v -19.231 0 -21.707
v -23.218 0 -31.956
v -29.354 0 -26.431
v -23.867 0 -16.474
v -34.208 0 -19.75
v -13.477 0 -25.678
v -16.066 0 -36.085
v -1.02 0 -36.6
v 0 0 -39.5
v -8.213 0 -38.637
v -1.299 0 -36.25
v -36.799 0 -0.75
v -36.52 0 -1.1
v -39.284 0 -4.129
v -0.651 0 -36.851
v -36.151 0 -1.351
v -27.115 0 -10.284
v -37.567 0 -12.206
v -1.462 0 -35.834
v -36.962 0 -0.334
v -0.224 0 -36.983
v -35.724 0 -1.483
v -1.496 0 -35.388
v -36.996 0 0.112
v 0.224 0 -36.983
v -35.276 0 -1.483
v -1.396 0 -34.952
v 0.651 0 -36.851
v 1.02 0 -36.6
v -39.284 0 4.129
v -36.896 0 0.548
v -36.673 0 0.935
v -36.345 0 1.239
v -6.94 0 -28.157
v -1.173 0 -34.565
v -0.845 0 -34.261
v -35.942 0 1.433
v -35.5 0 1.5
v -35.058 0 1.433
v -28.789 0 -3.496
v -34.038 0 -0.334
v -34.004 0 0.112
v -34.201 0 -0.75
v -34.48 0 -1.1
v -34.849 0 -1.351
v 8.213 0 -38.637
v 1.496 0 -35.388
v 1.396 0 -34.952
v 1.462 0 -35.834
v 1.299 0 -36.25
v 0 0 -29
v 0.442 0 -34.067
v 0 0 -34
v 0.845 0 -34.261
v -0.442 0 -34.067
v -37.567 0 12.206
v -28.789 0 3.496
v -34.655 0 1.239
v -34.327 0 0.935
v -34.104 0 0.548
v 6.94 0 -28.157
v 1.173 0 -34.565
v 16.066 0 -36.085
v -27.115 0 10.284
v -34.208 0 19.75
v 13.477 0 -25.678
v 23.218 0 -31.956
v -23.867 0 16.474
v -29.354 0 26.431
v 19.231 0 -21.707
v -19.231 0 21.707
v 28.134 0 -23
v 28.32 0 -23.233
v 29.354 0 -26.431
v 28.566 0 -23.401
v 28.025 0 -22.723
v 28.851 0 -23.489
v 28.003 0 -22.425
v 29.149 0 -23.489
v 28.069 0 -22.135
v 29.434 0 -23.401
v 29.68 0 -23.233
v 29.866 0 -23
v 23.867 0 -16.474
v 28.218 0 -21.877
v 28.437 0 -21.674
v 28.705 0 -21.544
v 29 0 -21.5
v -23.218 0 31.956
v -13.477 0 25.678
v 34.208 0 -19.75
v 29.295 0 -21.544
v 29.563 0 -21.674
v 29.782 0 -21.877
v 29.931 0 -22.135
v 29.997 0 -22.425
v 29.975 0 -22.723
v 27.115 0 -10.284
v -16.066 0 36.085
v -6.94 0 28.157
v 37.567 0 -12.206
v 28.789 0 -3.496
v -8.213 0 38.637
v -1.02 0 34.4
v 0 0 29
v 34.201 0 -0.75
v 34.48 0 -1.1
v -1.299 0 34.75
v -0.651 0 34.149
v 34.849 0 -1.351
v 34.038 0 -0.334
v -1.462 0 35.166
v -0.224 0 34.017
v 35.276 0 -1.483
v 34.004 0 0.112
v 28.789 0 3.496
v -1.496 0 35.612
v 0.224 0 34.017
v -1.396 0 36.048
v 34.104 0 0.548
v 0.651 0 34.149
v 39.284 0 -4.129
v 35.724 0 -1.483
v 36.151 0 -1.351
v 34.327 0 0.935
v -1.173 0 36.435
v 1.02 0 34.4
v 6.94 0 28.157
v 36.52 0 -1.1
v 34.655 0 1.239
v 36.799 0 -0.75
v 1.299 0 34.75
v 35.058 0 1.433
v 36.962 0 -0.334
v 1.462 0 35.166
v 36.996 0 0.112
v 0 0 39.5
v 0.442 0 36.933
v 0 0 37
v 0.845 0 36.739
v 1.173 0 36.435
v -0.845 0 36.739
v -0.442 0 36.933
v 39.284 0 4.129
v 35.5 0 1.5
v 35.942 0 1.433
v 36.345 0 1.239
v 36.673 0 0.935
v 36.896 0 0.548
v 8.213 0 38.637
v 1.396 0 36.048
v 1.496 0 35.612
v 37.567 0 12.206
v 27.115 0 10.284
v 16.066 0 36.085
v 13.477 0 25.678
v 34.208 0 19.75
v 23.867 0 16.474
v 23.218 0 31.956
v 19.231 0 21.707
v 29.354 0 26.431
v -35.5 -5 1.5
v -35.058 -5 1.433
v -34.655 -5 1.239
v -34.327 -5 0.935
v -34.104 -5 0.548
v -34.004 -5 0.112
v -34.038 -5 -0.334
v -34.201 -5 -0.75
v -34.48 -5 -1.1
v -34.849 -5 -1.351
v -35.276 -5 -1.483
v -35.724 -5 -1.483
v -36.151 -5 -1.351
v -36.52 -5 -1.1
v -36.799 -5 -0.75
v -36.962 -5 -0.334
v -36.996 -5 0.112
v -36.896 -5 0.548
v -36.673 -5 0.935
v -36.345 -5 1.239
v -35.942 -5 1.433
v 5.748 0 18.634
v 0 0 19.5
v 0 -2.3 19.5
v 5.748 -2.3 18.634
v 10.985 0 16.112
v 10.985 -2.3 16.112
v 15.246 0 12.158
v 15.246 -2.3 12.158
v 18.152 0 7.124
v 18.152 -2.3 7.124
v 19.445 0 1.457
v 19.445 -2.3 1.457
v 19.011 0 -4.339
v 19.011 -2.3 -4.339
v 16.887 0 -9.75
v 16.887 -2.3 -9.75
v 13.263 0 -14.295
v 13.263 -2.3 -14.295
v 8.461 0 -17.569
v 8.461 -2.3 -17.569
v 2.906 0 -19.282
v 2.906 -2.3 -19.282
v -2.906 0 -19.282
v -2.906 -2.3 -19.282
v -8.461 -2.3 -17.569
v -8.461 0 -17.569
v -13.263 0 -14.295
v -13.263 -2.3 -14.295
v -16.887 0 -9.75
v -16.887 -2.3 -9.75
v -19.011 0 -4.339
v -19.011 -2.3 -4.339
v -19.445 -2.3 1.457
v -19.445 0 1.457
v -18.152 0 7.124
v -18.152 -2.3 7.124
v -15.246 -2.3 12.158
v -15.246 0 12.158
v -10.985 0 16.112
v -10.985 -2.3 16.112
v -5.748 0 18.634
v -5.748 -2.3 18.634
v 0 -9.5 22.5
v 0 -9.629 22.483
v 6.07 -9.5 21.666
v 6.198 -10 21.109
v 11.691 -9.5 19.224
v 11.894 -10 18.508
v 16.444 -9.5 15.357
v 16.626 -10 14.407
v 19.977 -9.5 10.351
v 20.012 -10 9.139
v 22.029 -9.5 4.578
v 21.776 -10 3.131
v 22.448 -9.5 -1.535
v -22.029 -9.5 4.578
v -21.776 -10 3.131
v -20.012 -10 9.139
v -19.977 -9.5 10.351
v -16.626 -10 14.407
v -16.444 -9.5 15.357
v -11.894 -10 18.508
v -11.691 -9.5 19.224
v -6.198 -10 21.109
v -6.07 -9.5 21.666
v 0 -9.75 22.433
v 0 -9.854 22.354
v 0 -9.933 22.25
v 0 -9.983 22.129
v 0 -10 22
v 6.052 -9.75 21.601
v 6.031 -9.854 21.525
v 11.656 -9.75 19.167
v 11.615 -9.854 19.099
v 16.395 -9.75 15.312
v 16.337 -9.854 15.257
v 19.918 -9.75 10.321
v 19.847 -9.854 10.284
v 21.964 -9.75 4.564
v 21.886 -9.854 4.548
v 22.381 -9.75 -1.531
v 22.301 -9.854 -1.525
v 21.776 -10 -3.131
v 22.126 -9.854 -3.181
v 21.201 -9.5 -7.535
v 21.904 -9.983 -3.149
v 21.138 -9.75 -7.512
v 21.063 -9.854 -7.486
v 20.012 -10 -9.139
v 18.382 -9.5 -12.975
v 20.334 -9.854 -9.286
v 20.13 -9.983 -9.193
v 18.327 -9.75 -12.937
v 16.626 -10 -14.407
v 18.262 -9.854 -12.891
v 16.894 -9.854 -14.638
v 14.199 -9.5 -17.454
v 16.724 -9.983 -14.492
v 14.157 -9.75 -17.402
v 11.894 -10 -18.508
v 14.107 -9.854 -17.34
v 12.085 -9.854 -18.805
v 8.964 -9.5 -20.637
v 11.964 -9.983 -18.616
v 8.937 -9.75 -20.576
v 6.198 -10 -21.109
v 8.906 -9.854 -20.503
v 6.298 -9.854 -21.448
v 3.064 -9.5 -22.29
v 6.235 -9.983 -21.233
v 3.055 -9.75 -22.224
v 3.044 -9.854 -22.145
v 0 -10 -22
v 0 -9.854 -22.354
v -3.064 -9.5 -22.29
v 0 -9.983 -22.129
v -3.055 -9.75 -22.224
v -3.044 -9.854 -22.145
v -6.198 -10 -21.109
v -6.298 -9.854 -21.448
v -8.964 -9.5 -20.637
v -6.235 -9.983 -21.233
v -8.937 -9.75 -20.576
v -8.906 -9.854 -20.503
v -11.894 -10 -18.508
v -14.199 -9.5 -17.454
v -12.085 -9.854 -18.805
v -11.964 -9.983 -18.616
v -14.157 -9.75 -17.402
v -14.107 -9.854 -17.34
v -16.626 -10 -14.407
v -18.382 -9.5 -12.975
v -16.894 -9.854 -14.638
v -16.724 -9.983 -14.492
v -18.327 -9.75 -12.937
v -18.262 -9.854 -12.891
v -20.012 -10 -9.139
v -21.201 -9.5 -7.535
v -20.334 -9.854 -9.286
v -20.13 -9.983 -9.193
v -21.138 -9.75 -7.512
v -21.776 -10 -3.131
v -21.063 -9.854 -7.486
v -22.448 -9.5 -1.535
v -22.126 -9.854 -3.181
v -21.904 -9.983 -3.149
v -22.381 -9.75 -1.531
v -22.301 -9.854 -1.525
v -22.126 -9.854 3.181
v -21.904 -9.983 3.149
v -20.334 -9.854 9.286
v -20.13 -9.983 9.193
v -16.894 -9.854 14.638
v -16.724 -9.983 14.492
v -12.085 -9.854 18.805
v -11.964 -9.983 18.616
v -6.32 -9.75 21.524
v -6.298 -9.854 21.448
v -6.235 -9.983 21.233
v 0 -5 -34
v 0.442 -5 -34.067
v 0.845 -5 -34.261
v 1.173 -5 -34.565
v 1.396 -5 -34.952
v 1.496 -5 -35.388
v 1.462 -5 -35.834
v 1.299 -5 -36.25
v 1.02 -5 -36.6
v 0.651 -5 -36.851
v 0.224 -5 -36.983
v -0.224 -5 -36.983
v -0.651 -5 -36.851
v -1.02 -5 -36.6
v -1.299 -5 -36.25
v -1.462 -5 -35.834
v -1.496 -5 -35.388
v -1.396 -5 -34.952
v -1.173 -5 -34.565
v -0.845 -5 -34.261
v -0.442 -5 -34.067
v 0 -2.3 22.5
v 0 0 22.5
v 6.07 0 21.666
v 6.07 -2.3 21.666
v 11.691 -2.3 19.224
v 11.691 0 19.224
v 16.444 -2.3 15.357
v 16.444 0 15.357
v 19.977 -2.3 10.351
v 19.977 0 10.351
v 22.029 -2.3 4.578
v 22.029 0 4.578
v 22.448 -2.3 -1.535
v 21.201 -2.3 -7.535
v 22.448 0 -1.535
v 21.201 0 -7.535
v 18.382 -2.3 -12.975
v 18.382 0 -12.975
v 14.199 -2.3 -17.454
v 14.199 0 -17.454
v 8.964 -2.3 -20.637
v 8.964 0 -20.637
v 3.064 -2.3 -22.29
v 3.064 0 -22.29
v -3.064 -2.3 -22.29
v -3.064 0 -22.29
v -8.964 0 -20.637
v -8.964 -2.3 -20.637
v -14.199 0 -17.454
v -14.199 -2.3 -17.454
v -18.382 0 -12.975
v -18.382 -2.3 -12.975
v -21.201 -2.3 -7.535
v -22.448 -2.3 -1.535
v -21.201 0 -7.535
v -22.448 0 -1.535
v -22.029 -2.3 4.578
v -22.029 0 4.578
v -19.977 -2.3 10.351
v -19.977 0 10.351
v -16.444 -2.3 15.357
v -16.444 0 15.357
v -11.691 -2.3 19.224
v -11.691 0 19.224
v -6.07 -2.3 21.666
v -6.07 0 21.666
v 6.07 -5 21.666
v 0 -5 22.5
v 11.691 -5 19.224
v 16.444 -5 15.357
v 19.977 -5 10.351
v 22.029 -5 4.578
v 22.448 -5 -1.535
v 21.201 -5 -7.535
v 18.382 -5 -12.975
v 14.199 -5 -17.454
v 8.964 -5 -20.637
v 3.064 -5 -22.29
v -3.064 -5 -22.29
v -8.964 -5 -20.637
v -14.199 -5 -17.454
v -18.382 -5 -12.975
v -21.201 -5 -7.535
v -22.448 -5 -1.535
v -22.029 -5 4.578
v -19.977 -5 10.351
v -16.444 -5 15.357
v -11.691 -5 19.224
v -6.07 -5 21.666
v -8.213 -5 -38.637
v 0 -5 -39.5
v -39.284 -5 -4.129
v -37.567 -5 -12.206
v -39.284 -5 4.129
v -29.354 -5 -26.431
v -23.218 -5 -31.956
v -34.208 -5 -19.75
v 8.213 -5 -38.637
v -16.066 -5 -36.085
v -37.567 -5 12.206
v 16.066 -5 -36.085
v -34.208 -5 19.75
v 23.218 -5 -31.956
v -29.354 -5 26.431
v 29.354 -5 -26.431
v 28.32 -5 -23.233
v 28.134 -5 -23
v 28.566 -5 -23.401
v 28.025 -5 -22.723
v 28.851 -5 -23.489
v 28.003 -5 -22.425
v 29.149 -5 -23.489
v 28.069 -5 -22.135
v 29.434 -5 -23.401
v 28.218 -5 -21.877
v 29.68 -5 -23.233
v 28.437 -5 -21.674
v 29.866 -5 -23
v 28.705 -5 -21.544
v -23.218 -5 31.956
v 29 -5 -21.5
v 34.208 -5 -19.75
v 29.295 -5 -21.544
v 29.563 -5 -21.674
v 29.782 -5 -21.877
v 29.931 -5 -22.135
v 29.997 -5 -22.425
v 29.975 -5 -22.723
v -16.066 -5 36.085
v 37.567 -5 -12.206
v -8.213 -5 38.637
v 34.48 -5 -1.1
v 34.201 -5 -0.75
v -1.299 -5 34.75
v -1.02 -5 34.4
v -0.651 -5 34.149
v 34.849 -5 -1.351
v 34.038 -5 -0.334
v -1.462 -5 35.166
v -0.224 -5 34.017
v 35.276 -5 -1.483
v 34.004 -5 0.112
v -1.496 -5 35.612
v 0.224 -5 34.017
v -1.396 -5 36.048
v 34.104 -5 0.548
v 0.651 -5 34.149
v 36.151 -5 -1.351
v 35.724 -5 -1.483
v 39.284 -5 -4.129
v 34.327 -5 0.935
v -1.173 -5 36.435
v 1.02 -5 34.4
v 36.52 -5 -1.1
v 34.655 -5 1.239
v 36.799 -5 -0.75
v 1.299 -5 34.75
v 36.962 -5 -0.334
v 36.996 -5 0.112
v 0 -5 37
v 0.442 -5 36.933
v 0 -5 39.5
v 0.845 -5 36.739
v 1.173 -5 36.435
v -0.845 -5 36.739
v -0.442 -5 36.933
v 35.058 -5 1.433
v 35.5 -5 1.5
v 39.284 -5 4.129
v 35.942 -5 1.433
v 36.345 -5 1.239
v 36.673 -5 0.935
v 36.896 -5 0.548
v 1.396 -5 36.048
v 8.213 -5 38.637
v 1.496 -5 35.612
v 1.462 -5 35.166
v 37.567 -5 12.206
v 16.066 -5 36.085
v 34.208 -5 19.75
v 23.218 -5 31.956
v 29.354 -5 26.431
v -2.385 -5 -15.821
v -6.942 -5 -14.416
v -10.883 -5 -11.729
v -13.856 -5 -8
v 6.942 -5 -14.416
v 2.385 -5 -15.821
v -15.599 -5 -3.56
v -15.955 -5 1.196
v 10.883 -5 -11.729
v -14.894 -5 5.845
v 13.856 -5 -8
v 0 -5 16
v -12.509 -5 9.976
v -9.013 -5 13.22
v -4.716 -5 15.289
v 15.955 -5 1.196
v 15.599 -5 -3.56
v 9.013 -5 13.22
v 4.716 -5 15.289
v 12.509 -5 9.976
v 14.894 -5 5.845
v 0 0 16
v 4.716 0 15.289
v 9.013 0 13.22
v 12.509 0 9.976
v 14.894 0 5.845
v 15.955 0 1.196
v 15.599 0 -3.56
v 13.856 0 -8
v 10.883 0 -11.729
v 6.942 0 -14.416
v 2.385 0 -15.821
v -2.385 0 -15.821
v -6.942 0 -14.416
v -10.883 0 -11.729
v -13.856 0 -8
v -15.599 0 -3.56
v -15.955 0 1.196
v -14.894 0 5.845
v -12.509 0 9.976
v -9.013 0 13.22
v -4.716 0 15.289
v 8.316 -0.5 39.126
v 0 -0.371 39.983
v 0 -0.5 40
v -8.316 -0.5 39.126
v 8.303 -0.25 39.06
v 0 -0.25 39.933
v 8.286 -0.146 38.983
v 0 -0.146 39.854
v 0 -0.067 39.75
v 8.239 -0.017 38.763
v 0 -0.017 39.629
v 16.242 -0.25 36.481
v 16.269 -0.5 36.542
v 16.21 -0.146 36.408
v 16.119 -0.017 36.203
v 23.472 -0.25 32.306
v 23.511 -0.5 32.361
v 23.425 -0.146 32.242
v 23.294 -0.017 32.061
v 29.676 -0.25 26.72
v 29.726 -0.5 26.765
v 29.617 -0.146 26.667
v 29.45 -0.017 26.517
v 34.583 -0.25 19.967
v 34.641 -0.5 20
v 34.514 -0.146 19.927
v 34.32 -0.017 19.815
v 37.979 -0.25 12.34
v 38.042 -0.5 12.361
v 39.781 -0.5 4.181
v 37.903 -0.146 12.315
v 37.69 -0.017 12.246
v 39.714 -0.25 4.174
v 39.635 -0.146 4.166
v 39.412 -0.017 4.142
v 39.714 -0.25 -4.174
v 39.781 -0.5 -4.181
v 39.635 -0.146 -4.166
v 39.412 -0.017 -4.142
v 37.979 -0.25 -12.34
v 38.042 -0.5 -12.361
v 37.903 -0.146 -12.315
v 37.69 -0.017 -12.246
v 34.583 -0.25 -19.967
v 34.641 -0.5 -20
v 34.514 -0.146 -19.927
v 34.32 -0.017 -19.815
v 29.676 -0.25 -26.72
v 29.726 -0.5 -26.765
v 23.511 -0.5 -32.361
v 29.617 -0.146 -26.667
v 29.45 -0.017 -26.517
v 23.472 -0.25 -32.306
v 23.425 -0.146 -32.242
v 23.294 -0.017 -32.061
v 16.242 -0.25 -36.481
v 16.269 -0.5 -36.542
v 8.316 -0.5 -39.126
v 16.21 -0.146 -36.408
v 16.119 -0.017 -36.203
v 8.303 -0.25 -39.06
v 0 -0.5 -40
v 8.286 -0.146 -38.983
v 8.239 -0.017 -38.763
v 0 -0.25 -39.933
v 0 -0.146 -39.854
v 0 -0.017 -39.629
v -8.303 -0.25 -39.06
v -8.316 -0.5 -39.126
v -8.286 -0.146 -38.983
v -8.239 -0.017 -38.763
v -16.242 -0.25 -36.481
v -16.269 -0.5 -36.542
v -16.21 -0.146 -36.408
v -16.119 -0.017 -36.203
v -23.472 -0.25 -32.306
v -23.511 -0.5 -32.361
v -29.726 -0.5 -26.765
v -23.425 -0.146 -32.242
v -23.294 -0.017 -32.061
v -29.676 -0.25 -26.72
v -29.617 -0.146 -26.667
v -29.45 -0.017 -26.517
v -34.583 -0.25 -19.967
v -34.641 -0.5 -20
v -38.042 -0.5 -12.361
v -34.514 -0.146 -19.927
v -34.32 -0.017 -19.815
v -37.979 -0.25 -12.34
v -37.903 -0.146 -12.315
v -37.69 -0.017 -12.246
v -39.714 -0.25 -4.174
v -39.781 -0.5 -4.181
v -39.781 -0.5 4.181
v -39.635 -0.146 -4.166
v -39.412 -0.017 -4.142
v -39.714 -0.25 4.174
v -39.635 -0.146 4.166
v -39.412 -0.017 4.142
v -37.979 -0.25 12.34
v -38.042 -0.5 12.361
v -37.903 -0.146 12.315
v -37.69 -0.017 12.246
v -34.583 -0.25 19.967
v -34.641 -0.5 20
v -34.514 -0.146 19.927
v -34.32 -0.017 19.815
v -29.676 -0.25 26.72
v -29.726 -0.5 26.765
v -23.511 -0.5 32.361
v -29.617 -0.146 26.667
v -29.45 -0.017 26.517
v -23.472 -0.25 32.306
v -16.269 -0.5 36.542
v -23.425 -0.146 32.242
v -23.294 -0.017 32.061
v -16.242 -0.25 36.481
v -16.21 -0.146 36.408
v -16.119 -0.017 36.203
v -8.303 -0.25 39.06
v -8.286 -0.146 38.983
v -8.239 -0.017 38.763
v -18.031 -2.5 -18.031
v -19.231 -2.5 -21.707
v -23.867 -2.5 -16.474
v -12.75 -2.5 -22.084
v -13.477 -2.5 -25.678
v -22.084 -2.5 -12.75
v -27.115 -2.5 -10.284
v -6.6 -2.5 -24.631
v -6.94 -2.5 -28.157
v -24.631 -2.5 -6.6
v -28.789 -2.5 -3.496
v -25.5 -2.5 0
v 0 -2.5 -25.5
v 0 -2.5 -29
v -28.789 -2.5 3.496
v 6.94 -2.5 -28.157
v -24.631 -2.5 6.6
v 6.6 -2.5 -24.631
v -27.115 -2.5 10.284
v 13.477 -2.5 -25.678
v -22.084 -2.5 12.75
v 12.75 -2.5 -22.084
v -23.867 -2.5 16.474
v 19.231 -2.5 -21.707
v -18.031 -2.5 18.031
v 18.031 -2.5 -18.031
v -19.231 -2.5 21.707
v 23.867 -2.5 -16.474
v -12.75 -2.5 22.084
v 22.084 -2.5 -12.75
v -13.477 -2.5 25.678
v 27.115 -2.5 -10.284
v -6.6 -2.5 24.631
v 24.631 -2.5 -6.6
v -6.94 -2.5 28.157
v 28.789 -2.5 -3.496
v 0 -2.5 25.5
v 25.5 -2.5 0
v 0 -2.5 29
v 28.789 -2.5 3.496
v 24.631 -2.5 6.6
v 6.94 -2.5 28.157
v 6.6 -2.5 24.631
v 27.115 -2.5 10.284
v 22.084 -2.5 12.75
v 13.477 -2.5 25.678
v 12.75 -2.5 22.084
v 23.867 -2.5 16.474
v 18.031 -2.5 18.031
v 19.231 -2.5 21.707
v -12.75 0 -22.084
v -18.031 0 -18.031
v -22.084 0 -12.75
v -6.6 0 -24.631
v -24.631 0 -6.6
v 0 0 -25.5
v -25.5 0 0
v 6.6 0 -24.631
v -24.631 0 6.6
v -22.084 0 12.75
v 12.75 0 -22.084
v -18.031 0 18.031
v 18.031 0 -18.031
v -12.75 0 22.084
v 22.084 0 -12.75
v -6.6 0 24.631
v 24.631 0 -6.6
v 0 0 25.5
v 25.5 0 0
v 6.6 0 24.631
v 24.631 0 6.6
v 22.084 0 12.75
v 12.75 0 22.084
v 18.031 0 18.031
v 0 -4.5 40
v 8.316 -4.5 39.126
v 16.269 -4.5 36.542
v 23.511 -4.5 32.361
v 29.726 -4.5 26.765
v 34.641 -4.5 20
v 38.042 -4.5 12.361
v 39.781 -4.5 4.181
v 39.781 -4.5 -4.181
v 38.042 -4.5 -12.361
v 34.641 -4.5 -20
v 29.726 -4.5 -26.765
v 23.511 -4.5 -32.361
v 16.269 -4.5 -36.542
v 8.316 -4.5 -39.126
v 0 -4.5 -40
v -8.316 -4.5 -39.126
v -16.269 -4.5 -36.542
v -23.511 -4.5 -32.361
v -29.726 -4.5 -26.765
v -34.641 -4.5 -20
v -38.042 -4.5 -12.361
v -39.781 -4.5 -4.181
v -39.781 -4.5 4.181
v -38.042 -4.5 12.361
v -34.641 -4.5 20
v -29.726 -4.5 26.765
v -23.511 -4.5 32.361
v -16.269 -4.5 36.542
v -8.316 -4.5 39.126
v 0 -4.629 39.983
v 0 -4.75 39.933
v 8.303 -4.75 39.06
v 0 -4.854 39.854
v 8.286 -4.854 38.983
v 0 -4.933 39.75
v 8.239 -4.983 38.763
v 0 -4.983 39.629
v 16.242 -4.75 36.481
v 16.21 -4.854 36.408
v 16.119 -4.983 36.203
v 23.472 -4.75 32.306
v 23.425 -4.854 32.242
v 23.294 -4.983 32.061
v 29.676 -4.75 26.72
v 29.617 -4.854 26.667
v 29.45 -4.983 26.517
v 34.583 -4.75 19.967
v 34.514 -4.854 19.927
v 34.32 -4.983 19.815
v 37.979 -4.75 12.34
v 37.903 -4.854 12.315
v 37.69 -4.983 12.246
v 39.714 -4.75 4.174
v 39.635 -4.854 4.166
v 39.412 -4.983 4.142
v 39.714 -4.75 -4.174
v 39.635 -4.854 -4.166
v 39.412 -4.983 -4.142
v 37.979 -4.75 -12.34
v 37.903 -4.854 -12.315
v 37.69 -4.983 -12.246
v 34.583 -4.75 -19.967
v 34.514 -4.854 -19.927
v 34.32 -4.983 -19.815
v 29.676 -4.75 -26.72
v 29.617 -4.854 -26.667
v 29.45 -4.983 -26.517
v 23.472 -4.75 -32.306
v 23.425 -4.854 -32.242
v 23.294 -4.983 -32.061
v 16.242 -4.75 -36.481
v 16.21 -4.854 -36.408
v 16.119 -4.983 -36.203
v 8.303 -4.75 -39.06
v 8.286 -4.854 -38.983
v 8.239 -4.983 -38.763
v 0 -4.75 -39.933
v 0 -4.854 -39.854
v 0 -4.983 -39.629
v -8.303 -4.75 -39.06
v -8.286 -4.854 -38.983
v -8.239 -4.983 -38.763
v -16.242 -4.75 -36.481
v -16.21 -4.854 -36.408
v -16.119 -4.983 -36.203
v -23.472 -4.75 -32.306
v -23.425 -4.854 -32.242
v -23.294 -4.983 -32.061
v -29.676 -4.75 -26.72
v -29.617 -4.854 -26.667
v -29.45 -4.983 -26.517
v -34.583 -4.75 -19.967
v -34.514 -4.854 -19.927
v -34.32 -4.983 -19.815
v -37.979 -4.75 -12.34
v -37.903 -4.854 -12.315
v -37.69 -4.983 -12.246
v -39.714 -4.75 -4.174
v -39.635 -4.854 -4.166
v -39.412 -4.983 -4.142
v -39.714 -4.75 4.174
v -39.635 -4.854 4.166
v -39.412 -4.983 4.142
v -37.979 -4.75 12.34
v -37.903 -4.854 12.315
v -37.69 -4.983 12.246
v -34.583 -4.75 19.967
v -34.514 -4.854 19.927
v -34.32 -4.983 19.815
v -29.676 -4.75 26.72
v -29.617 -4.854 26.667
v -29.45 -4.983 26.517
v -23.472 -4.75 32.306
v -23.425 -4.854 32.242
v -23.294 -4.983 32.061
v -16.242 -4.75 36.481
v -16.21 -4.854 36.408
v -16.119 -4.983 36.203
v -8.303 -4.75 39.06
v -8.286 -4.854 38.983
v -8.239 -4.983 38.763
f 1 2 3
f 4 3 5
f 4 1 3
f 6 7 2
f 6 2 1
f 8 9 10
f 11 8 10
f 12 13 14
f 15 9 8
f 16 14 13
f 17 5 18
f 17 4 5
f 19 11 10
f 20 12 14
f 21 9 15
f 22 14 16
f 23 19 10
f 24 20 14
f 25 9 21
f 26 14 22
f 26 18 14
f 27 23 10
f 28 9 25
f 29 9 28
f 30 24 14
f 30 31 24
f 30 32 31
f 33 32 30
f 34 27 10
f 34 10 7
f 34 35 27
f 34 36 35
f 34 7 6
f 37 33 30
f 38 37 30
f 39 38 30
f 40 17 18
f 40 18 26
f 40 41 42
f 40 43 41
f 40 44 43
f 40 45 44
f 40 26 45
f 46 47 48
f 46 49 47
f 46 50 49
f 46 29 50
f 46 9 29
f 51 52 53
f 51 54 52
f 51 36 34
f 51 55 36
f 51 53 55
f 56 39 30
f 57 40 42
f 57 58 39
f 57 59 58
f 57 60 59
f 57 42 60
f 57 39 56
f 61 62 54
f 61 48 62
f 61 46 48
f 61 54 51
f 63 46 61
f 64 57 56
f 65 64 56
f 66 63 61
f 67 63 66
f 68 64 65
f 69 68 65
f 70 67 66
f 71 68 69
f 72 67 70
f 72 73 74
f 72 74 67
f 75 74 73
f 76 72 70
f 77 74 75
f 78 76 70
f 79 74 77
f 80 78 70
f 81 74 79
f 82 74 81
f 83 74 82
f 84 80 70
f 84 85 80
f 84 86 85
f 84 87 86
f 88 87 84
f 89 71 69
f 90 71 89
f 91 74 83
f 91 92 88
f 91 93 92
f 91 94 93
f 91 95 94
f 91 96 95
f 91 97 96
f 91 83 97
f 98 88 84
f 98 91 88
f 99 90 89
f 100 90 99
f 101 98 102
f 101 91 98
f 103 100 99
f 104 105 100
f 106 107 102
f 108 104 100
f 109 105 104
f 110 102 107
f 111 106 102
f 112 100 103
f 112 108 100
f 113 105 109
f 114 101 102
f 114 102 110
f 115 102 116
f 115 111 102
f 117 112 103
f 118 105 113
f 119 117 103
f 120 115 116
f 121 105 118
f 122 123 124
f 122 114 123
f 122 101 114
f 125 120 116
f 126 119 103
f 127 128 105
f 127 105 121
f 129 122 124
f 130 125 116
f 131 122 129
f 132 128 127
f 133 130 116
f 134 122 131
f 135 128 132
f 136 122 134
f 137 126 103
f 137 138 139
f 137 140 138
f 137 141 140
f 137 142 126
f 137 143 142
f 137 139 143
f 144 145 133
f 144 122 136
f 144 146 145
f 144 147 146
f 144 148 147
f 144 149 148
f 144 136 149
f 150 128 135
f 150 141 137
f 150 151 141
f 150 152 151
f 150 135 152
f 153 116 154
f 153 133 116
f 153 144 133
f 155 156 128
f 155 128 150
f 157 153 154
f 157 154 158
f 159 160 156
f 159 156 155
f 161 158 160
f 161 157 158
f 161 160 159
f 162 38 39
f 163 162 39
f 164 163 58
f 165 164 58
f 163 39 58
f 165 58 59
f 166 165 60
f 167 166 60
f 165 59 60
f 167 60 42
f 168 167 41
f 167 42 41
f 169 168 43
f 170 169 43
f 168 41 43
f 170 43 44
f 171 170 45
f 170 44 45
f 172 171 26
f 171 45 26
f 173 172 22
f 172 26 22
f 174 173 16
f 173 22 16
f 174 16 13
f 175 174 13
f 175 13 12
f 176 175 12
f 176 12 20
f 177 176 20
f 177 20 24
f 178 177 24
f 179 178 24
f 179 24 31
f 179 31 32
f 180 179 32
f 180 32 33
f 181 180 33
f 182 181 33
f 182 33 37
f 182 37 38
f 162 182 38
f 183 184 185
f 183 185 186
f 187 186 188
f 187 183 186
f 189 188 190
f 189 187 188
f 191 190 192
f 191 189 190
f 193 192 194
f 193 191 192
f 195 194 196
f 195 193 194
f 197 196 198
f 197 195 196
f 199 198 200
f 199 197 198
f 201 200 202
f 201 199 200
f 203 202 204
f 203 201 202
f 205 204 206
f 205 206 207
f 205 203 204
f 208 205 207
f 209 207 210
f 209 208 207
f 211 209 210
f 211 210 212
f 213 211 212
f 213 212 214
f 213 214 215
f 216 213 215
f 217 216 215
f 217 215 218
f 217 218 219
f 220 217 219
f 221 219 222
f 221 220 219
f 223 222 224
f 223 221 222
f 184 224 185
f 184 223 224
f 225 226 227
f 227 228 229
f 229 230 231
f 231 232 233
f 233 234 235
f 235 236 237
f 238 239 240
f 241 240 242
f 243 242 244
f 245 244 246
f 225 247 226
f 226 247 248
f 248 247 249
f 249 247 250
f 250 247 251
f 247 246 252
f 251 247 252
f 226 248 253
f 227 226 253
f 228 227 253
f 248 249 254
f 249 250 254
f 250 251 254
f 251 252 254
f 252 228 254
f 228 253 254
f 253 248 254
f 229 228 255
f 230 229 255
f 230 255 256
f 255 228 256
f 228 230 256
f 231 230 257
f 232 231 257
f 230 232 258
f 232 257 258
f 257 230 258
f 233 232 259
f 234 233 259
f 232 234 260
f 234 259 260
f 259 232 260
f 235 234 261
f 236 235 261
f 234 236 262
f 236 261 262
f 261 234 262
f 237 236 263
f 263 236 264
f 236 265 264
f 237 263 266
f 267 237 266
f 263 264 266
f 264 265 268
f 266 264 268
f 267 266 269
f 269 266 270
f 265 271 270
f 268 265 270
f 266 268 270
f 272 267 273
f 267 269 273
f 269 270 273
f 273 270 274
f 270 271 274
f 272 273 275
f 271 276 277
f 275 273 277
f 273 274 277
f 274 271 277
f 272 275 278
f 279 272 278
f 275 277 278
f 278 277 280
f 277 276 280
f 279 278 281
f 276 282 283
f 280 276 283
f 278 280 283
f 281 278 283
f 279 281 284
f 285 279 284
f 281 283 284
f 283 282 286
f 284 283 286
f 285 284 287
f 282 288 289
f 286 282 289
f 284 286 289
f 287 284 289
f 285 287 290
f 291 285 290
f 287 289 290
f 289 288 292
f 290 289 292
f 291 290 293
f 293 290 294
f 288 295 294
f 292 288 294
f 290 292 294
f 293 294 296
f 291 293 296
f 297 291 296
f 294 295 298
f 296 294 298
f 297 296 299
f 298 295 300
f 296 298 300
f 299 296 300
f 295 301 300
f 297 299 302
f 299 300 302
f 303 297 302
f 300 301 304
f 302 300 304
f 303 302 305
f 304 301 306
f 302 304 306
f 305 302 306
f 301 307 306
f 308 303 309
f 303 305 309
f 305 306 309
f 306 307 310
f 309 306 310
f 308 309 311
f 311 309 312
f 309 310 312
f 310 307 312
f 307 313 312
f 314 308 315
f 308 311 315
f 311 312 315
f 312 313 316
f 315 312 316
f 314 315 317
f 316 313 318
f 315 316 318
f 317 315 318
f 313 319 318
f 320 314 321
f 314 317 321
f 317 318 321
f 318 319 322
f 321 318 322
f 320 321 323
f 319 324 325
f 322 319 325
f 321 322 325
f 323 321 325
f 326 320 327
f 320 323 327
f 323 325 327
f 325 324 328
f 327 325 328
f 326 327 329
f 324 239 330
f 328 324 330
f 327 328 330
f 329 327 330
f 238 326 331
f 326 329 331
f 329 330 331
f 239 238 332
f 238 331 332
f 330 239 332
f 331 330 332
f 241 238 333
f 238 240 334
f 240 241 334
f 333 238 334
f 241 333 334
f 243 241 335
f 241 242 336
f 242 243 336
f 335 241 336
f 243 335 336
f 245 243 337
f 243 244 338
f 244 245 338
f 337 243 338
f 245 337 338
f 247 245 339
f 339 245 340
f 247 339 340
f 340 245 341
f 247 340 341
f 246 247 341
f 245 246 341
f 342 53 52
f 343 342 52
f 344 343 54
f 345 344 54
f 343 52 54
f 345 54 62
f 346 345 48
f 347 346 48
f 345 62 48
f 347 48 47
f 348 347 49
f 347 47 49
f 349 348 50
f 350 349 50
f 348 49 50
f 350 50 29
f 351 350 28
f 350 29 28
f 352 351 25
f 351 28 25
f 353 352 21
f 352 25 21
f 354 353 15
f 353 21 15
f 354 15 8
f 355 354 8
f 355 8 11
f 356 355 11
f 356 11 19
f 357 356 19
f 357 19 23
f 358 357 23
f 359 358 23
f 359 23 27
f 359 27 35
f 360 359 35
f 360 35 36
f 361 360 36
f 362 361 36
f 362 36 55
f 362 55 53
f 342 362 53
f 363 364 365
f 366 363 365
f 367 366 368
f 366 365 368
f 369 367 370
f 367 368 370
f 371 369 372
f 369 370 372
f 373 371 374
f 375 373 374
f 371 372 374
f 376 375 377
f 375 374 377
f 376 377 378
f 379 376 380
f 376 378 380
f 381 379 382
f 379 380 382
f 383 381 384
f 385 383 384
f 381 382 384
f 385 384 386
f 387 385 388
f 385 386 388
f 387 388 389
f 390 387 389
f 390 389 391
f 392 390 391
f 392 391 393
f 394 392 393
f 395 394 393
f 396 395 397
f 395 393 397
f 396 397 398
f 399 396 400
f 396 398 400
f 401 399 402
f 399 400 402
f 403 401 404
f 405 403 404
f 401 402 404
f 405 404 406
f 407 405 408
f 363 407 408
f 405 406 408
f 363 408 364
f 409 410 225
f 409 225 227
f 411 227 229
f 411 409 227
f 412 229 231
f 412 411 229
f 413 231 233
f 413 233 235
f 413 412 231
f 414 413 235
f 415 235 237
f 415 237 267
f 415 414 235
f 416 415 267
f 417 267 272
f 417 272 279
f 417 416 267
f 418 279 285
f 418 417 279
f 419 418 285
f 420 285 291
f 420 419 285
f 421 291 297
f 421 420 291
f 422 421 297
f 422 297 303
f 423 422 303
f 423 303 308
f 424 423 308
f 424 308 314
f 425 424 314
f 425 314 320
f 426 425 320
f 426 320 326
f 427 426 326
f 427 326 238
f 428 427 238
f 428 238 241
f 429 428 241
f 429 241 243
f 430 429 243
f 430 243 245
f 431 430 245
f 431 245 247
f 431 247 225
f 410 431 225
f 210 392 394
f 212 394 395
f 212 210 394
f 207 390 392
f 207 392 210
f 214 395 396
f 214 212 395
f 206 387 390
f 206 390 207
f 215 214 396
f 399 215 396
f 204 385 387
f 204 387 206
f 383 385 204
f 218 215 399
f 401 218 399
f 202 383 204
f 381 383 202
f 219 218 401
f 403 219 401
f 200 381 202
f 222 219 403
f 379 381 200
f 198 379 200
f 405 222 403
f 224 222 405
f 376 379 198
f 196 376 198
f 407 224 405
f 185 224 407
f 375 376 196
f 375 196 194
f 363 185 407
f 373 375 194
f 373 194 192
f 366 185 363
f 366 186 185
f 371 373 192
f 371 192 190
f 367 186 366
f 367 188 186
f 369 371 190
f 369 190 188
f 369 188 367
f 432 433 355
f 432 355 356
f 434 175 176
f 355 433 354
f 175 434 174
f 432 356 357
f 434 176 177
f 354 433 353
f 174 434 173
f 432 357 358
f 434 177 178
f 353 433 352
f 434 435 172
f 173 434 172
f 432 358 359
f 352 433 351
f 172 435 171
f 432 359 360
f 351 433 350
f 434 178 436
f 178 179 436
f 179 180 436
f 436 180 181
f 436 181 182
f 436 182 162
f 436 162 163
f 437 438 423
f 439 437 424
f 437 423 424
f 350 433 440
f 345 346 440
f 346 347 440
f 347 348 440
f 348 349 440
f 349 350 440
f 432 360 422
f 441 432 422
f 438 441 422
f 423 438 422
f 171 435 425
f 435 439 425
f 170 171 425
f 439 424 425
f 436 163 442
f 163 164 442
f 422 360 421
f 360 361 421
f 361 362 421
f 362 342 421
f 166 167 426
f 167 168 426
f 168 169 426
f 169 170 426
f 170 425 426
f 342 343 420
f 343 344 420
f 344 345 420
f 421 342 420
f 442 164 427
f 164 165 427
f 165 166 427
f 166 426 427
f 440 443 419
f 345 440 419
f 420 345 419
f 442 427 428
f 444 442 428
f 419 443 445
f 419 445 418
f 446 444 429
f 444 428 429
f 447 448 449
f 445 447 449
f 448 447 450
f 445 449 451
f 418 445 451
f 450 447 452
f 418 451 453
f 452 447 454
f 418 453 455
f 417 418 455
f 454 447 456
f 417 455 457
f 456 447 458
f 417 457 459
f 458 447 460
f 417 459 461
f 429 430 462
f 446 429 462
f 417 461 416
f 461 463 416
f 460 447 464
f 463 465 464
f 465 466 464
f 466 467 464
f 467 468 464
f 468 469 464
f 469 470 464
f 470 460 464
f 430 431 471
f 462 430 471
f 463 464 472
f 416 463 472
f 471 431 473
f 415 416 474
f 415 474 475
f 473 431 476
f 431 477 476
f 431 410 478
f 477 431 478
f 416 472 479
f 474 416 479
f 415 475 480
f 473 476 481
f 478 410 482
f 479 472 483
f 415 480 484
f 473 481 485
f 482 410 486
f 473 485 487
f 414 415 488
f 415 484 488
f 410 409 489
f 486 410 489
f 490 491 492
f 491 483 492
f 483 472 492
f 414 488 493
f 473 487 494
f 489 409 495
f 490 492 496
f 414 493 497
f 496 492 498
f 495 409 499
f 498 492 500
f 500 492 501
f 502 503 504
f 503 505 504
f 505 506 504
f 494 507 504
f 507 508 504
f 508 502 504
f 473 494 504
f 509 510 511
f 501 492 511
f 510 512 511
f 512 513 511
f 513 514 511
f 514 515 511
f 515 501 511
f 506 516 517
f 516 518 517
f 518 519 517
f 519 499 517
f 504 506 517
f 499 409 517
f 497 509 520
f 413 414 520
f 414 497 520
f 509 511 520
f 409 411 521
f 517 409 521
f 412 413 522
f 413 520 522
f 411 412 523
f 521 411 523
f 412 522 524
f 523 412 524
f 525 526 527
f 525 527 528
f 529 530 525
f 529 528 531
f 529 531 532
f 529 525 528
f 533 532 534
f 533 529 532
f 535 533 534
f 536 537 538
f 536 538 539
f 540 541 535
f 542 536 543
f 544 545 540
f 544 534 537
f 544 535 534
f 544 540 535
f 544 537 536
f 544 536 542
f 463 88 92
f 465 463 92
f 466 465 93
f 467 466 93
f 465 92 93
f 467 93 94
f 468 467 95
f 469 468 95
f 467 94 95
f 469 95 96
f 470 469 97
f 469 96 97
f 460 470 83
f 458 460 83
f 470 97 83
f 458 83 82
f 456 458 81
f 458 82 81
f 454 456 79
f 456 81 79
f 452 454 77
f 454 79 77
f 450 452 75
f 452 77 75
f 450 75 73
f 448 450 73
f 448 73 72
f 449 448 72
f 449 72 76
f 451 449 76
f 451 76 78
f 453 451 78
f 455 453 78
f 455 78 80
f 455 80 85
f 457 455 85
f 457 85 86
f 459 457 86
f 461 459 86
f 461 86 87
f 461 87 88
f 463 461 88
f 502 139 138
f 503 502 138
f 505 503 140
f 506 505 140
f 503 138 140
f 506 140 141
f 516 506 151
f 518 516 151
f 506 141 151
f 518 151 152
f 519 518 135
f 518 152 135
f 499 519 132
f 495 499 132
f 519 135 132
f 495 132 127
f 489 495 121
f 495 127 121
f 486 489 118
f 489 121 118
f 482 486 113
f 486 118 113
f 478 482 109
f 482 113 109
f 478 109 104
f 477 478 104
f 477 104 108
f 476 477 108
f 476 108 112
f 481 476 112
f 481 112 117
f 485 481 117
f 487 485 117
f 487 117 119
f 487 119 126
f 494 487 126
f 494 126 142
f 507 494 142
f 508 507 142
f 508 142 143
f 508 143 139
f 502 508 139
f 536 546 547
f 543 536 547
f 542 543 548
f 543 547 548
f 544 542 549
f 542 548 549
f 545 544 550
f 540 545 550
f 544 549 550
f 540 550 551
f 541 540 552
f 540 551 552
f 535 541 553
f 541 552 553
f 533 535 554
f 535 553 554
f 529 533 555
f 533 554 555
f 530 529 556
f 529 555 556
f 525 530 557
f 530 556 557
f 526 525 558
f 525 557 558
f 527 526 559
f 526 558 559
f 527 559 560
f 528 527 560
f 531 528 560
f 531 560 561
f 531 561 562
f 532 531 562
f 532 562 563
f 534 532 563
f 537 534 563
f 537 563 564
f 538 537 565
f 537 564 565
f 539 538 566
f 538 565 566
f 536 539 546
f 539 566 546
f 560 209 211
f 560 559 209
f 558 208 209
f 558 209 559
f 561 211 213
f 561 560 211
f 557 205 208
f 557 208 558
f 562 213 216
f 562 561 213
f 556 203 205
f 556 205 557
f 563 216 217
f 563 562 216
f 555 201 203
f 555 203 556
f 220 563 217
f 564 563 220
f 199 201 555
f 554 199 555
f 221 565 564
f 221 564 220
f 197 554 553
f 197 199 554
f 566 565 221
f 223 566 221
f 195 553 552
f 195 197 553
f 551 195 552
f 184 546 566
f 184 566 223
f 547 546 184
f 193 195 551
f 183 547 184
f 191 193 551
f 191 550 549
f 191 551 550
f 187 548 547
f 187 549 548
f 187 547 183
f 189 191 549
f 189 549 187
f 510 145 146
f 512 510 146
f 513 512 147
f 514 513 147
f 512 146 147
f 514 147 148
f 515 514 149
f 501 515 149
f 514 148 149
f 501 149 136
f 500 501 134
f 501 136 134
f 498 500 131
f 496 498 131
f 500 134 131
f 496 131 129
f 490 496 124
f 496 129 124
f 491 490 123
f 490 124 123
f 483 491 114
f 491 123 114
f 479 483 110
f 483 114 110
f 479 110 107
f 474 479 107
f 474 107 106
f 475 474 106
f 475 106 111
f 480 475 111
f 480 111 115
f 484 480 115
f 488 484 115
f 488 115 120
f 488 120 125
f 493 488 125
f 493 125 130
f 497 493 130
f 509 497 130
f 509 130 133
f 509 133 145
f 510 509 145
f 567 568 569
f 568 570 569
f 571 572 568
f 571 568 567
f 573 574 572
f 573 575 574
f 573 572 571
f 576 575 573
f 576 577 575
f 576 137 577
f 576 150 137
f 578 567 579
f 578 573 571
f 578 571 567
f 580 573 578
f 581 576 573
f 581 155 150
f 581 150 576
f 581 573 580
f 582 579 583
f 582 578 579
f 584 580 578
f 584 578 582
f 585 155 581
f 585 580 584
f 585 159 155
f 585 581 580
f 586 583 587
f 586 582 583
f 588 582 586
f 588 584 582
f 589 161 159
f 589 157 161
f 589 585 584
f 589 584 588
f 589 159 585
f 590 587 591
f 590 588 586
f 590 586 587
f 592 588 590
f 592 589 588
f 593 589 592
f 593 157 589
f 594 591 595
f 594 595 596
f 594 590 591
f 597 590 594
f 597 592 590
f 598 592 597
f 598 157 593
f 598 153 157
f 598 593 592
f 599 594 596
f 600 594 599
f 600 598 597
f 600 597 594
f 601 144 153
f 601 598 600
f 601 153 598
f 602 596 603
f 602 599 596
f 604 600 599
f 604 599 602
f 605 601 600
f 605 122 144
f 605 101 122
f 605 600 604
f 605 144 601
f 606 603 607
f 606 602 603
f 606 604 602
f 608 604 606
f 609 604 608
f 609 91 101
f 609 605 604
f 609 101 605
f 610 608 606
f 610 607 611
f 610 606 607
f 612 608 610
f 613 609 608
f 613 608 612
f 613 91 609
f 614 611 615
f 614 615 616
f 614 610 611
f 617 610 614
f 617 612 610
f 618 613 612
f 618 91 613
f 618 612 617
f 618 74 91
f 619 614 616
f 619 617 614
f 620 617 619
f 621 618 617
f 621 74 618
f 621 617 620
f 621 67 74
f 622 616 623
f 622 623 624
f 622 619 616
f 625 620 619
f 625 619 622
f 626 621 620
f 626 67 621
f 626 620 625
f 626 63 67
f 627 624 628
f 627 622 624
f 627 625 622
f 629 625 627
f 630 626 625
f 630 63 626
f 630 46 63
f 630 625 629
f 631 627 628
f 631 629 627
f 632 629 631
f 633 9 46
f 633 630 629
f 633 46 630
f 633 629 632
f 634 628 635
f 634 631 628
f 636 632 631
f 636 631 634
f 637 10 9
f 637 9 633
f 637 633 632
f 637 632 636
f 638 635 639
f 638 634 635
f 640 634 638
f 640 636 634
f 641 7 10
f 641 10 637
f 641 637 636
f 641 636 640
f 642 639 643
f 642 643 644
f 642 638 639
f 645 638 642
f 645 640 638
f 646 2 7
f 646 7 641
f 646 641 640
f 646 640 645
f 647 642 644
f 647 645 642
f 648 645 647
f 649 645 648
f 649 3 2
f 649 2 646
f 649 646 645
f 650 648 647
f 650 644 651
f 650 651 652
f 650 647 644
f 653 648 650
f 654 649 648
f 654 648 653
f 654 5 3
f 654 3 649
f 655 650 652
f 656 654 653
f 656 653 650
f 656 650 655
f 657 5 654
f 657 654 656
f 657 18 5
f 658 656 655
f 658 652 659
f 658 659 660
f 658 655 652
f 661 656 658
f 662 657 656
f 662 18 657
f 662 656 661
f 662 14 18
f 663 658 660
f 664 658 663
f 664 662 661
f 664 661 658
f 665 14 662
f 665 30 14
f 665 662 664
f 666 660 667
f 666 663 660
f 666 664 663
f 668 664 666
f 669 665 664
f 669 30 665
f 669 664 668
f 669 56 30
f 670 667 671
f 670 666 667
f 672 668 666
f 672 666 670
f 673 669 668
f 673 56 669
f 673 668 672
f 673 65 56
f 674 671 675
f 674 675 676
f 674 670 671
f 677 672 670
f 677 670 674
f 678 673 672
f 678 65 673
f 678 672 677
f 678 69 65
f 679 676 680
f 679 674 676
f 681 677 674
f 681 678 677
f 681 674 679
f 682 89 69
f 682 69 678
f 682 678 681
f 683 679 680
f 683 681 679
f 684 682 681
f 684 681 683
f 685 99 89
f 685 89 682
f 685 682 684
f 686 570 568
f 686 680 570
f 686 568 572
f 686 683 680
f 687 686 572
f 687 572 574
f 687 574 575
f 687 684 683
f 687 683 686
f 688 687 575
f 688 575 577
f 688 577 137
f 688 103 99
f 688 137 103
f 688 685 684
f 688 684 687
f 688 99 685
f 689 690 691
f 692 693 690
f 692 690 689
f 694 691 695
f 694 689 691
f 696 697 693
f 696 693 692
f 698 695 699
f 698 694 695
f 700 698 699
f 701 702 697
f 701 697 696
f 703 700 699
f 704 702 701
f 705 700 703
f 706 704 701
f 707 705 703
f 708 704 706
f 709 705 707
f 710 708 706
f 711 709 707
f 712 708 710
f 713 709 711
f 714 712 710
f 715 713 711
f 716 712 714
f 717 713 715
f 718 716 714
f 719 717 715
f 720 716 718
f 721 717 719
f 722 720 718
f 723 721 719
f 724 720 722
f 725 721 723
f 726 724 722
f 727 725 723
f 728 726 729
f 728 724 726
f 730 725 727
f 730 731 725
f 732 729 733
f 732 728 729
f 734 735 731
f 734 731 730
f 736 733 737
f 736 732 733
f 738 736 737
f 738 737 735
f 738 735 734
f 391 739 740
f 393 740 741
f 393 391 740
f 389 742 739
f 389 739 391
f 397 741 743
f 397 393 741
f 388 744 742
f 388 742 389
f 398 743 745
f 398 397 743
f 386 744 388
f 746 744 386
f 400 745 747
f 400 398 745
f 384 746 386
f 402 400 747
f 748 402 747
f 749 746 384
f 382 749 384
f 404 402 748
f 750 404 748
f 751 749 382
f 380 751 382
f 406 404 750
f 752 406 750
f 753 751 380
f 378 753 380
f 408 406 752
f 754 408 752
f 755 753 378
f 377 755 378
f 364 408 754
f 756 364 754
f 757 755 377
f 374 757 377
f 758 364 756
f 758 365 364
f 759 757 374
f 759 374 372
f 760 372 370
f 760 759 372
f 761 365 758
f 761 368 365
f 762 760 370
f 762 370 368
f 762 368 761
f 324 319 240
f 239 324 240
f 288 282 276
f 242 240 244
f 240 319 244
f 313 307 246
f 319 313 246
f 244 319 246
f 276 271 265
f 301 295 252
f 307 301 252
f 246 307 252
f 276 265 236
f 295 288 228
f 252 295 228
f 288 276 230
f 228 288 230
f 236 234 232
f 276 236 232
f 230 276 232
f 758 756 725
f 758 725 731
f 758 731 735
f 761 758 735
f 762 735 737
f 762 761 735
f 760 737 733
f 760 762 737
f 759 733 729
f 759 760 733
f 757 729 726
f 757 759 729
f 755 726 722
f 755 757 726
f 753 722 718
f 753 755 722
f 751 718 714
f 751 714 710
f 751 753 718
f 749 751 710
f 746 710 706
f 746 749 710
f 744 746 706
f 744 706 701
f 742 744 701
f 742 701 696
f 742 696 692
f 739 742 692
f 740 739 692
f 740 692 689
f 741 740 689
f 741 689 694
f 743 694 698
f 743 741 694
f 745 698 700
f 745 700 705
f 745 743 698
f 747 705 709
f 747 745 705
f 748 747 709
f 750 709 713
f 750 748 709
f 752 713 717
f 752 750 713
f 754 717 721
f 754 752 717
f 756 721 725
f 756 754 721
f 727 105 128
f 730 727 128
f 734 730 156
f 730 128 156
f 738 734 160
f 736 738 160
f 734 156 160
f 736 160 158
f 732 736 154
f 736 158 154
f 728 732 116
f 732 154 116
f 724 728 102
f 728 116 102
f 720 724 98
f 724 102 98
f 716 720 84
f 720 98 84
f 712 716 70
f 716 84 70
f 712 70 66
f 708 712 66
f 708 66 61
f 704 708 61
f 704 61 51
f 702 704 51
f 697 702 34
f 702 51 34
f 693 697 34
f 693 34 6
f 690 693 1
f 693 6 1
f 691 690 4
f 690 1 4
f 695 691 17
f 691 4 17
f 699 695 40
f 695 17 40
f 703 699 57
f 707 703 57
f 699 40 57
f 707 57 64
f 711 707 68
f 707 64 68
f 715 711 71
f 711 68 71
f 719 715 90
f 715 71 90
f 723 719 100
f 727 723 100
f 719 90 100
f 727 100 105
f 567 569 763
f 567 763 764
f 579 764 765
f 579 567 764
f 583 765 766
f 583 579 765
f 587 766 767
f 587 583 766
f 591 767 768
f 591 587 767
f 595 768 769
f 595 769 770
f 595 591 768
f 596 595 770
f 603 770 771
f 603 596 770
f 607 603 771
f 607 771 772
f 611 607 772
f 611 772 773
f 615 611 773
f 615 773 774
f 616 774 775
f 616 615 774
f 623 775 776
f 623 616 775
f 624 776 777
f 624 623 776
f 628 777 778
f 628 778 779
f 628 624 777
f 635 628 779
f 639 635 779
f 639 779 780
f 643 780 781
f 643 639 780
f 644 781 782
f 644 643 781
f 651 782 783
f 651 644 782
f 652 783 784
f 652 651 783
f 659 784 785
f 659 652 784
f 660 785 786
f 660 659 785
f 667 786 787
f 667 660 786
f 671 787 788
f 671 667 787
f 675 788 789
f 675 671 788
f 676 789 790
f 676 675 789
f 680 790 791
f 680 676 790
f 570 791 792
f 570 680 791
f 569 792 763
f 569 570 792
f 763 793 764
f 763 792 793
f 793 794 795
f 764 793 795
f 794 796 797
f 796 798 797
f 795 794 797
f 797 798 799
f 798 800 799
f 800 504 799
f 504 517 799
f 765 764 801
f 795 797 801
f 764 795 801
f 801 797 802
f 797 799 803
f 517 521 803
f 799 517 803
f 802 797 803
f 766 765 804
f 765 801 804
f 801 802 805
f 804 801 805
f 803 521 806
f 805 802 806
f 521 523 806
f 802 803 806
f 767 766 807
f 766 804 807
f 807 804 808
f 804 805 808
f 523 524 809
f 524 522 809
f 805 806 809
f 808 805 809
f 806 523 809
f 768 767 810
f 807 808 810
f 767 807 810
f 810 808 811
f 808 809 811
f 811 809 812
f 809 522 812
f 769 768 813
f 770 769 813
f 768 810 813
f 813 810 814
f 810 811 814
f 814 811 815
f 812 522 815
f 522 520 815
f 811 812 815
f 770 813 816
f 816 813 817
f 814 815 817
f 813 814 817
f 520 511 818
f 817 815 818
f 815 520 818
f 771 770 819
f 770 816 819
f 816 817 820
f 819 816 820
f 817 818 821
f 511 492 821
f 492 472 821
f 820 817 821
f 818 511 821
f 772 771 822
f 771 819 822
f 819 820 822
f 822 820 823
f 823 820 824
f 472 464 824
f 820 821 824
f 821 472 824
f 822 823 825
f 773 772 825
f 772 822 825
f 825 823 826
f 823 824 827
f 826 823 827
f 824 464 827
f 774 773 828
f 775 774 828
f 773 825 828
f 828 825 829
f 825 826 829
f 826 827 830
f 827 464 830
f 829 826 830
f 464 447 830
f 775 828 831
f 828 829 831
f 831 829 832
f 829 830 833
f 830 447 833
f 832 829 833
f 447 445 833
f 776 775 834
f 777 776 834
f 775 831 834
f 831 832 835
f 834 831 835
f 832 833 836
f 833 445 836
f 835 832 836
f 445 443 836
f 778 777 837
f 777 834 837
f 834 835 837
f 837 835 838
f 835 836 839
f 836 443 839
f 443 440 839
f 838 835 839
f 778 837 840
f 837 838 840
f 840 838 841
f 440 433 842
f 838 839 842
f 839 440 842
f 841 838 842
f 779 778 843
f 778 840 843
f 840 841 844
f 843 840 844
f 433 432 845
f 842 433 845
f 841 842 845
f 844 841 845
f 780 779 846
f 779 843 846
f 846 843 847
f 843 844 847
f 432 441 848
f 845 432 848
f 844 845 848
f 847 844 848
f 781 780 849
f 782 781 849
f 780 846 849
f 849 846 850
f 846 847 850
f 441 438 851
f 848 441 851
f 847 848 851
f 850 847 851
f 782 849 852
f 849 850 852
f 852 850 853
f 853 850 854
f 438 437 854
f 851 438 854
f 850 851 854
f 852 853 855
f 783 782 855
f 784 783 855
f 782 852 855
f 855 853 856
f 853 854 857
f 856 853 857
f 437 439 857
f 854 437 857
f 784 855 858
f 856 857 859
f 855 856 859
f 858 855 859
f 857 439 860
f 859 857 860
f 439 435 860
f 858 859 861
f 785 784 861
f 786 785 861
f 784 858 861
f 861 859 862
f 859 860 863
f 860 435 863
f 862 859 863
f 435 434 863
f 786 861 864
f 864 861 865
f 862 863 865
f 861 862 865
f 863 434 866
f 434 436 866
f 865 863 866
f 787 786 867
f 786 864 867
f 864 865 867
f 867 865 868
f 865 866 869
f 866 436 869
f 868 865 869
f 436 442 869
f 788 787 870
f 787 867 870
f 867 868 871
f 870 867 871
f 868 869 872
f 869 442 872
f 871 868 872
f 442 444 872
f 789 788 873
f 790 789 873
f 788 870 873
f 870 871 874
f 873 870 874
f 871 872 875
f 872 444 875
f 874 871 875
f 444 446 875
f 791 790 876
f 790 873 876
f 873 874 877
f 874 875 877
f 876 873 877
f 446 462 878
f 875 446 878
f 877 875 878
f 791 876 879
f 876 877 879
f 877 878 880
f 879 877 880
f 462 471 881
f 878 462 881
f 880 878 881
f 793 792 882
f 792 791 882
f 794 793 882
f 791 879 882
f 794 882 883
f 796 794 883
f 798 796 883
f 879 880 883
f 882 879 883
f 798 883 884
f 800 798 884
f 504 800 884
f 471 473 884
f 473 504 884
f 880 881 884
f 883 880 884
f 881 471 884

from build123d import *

# Parameters (mm, degrees)
SKETCH1_R            = 40
BOSS_EXTRUDE11_DEPTH = 5
SKETCH1_14_R         = 1.5
CUT_EXTRUDE5_DEPTH   = 57.789083458
OFFSETCIRCLE_R       = 22.5
BOSS_EXTRUDE14_DEPTH = 10
SKETCH1_15_R         = 22.5
SKETCH1_15_R_2       = 19.5
CUT_EXTRUDE6_DEPTH   = 2.3
SKETCH1_16_R         = 29
SKETCH1_16_R_2       = 25.5
CUT_EXTRUDE7_DEPTH   = 2.5
SKETCH10_R           = 1
CUT_EXTRUDE8_DEPTH   = 58.445626465
SKETCH1_17_R         = 16
CUT_EXTRUDE9_DEPTH   = 5
FILLET1_R            = 0.5
FILLET2_R            = 0.5
FILLET3_R            = 0.5


with BuildPart() as part:
    # Sketch1 → Boss-Extrude11 (new body)
    with BuildSketch(Plane(origin=(0, 0, 0), x_dir=(1, 0, 0), z_dir=(0, 1, 0))):
        Circle(SKETCH1_R)
    extrude(amount=-BOSS_EXTRUDE11_DEPTH)

    # Sketch1<14> → Cut-Extrude5 (cut, through all)
    with BuildSketch(Plane(origin=(0, 0, 0), x_dir=(1, 0, 0), z_dir=(0, 1, 0))):
        with Locations((35.5, 0)):
            Circle(SKETCH1_14_R)
        with Locations((0, -35.5)):
            Circle(SKETCH1_14_R)
        with Locations((-35.5, 0)):
            Circle(SKETCH1_14_R)
        with Locations((0, 35.5)):
            Circle(SKETCH1_14_R)
    extrude(amount=-CUT_EXTRUDE5_DEPTH, mode=Mode.SUBTRACT)

    # offsetCircle → Boss-Extrude14 (add)
    with BuildSketch(Plane(origin=(0, 0, 0), x_dir=(1, 0, 0), z_dir=(0, 1, 0))):
        Circle(OFFSETCIRCLE_R)
    extrude(amount=-BOSS_EXTRUDE14_DEPTH)

    # Sketch1<15> → Cut-Extrude6 (cut)
    with BuildSketch(Plane(origin=(0, 0, 0), x_dir=(1, 0, 0), z_dir=(0, 1, 0))):
        Circle(SKETCH1_15_R)
        Circle(SKETCH1_15_R_2, mode=Mode.SUBTRACT)
    extrude(amount=-CUT_EXTRUDE6_DEPTH, mode=Mode.SUBTRACT)

    # Sketch1<16> → Cut-Extrude7 (cut)
    with BuildSketch(Plane(origin=(0, 0, 0), x_dir=(1, 0, 0), z_dir=(0, 1, 0))):
        Circle(SKETCH1_16_R)
        Circle(SKETCH1_16_R_2, mode=Mode.SUBTRACT)
    extrude(amount=-CUT_EXTRUDE7_DEPTH, mode=Mode.SUBTRACT)

    # Sketch10 → Cut-Extrude8 (cut, through all)
    with BuildSketch(Plane(origin=(0, 0, 0), x_dir=(1, 0, 0), z_dir=(0, 1, 0))):
        with Locations((29, 22.5)):
            Circle(SKETCH10_R)
    extrude(amount=-CUT_EXTRUDE8_DEPTH, mode=Mode.SUBTRACT)

    # Sketch1<17> → Cut-Extrude9 (cut)
    with BuildSketch(Plane(origin=(0, 0, 0), x_dir=(1, 0, 0), z_dir=(0, 1, 0))):
        Circle(SKETCH1_17_R)
    extrude(amount=-CUT_EXTRUDE9_DEPTH, mode=Mode.SUBTRACT)

    # Fillet1
    fillet1_edges = [part.edges().sort_by_distance(p)[0] for p in [
        (-40, -5, 0),
    ]]
    fillet(fillet1_edges, radius=FILLET1_R)

    # Fillet2
    fillet2_edges = [part.edges().sort_by_distance(p)[0] for p in [
        (-40, 0, 0),
    ]]
    fillet(fillet2_edges, radius=FILLET2_R)

    # Fillet3
    fillet3_edges = [part.edges().sort_by_distance(p)[0] for p in [
        (-22.5, -10, 0),
    ]]
    fillet(fillet3_edges, radius=FILLET3_R)


solid = part.part
